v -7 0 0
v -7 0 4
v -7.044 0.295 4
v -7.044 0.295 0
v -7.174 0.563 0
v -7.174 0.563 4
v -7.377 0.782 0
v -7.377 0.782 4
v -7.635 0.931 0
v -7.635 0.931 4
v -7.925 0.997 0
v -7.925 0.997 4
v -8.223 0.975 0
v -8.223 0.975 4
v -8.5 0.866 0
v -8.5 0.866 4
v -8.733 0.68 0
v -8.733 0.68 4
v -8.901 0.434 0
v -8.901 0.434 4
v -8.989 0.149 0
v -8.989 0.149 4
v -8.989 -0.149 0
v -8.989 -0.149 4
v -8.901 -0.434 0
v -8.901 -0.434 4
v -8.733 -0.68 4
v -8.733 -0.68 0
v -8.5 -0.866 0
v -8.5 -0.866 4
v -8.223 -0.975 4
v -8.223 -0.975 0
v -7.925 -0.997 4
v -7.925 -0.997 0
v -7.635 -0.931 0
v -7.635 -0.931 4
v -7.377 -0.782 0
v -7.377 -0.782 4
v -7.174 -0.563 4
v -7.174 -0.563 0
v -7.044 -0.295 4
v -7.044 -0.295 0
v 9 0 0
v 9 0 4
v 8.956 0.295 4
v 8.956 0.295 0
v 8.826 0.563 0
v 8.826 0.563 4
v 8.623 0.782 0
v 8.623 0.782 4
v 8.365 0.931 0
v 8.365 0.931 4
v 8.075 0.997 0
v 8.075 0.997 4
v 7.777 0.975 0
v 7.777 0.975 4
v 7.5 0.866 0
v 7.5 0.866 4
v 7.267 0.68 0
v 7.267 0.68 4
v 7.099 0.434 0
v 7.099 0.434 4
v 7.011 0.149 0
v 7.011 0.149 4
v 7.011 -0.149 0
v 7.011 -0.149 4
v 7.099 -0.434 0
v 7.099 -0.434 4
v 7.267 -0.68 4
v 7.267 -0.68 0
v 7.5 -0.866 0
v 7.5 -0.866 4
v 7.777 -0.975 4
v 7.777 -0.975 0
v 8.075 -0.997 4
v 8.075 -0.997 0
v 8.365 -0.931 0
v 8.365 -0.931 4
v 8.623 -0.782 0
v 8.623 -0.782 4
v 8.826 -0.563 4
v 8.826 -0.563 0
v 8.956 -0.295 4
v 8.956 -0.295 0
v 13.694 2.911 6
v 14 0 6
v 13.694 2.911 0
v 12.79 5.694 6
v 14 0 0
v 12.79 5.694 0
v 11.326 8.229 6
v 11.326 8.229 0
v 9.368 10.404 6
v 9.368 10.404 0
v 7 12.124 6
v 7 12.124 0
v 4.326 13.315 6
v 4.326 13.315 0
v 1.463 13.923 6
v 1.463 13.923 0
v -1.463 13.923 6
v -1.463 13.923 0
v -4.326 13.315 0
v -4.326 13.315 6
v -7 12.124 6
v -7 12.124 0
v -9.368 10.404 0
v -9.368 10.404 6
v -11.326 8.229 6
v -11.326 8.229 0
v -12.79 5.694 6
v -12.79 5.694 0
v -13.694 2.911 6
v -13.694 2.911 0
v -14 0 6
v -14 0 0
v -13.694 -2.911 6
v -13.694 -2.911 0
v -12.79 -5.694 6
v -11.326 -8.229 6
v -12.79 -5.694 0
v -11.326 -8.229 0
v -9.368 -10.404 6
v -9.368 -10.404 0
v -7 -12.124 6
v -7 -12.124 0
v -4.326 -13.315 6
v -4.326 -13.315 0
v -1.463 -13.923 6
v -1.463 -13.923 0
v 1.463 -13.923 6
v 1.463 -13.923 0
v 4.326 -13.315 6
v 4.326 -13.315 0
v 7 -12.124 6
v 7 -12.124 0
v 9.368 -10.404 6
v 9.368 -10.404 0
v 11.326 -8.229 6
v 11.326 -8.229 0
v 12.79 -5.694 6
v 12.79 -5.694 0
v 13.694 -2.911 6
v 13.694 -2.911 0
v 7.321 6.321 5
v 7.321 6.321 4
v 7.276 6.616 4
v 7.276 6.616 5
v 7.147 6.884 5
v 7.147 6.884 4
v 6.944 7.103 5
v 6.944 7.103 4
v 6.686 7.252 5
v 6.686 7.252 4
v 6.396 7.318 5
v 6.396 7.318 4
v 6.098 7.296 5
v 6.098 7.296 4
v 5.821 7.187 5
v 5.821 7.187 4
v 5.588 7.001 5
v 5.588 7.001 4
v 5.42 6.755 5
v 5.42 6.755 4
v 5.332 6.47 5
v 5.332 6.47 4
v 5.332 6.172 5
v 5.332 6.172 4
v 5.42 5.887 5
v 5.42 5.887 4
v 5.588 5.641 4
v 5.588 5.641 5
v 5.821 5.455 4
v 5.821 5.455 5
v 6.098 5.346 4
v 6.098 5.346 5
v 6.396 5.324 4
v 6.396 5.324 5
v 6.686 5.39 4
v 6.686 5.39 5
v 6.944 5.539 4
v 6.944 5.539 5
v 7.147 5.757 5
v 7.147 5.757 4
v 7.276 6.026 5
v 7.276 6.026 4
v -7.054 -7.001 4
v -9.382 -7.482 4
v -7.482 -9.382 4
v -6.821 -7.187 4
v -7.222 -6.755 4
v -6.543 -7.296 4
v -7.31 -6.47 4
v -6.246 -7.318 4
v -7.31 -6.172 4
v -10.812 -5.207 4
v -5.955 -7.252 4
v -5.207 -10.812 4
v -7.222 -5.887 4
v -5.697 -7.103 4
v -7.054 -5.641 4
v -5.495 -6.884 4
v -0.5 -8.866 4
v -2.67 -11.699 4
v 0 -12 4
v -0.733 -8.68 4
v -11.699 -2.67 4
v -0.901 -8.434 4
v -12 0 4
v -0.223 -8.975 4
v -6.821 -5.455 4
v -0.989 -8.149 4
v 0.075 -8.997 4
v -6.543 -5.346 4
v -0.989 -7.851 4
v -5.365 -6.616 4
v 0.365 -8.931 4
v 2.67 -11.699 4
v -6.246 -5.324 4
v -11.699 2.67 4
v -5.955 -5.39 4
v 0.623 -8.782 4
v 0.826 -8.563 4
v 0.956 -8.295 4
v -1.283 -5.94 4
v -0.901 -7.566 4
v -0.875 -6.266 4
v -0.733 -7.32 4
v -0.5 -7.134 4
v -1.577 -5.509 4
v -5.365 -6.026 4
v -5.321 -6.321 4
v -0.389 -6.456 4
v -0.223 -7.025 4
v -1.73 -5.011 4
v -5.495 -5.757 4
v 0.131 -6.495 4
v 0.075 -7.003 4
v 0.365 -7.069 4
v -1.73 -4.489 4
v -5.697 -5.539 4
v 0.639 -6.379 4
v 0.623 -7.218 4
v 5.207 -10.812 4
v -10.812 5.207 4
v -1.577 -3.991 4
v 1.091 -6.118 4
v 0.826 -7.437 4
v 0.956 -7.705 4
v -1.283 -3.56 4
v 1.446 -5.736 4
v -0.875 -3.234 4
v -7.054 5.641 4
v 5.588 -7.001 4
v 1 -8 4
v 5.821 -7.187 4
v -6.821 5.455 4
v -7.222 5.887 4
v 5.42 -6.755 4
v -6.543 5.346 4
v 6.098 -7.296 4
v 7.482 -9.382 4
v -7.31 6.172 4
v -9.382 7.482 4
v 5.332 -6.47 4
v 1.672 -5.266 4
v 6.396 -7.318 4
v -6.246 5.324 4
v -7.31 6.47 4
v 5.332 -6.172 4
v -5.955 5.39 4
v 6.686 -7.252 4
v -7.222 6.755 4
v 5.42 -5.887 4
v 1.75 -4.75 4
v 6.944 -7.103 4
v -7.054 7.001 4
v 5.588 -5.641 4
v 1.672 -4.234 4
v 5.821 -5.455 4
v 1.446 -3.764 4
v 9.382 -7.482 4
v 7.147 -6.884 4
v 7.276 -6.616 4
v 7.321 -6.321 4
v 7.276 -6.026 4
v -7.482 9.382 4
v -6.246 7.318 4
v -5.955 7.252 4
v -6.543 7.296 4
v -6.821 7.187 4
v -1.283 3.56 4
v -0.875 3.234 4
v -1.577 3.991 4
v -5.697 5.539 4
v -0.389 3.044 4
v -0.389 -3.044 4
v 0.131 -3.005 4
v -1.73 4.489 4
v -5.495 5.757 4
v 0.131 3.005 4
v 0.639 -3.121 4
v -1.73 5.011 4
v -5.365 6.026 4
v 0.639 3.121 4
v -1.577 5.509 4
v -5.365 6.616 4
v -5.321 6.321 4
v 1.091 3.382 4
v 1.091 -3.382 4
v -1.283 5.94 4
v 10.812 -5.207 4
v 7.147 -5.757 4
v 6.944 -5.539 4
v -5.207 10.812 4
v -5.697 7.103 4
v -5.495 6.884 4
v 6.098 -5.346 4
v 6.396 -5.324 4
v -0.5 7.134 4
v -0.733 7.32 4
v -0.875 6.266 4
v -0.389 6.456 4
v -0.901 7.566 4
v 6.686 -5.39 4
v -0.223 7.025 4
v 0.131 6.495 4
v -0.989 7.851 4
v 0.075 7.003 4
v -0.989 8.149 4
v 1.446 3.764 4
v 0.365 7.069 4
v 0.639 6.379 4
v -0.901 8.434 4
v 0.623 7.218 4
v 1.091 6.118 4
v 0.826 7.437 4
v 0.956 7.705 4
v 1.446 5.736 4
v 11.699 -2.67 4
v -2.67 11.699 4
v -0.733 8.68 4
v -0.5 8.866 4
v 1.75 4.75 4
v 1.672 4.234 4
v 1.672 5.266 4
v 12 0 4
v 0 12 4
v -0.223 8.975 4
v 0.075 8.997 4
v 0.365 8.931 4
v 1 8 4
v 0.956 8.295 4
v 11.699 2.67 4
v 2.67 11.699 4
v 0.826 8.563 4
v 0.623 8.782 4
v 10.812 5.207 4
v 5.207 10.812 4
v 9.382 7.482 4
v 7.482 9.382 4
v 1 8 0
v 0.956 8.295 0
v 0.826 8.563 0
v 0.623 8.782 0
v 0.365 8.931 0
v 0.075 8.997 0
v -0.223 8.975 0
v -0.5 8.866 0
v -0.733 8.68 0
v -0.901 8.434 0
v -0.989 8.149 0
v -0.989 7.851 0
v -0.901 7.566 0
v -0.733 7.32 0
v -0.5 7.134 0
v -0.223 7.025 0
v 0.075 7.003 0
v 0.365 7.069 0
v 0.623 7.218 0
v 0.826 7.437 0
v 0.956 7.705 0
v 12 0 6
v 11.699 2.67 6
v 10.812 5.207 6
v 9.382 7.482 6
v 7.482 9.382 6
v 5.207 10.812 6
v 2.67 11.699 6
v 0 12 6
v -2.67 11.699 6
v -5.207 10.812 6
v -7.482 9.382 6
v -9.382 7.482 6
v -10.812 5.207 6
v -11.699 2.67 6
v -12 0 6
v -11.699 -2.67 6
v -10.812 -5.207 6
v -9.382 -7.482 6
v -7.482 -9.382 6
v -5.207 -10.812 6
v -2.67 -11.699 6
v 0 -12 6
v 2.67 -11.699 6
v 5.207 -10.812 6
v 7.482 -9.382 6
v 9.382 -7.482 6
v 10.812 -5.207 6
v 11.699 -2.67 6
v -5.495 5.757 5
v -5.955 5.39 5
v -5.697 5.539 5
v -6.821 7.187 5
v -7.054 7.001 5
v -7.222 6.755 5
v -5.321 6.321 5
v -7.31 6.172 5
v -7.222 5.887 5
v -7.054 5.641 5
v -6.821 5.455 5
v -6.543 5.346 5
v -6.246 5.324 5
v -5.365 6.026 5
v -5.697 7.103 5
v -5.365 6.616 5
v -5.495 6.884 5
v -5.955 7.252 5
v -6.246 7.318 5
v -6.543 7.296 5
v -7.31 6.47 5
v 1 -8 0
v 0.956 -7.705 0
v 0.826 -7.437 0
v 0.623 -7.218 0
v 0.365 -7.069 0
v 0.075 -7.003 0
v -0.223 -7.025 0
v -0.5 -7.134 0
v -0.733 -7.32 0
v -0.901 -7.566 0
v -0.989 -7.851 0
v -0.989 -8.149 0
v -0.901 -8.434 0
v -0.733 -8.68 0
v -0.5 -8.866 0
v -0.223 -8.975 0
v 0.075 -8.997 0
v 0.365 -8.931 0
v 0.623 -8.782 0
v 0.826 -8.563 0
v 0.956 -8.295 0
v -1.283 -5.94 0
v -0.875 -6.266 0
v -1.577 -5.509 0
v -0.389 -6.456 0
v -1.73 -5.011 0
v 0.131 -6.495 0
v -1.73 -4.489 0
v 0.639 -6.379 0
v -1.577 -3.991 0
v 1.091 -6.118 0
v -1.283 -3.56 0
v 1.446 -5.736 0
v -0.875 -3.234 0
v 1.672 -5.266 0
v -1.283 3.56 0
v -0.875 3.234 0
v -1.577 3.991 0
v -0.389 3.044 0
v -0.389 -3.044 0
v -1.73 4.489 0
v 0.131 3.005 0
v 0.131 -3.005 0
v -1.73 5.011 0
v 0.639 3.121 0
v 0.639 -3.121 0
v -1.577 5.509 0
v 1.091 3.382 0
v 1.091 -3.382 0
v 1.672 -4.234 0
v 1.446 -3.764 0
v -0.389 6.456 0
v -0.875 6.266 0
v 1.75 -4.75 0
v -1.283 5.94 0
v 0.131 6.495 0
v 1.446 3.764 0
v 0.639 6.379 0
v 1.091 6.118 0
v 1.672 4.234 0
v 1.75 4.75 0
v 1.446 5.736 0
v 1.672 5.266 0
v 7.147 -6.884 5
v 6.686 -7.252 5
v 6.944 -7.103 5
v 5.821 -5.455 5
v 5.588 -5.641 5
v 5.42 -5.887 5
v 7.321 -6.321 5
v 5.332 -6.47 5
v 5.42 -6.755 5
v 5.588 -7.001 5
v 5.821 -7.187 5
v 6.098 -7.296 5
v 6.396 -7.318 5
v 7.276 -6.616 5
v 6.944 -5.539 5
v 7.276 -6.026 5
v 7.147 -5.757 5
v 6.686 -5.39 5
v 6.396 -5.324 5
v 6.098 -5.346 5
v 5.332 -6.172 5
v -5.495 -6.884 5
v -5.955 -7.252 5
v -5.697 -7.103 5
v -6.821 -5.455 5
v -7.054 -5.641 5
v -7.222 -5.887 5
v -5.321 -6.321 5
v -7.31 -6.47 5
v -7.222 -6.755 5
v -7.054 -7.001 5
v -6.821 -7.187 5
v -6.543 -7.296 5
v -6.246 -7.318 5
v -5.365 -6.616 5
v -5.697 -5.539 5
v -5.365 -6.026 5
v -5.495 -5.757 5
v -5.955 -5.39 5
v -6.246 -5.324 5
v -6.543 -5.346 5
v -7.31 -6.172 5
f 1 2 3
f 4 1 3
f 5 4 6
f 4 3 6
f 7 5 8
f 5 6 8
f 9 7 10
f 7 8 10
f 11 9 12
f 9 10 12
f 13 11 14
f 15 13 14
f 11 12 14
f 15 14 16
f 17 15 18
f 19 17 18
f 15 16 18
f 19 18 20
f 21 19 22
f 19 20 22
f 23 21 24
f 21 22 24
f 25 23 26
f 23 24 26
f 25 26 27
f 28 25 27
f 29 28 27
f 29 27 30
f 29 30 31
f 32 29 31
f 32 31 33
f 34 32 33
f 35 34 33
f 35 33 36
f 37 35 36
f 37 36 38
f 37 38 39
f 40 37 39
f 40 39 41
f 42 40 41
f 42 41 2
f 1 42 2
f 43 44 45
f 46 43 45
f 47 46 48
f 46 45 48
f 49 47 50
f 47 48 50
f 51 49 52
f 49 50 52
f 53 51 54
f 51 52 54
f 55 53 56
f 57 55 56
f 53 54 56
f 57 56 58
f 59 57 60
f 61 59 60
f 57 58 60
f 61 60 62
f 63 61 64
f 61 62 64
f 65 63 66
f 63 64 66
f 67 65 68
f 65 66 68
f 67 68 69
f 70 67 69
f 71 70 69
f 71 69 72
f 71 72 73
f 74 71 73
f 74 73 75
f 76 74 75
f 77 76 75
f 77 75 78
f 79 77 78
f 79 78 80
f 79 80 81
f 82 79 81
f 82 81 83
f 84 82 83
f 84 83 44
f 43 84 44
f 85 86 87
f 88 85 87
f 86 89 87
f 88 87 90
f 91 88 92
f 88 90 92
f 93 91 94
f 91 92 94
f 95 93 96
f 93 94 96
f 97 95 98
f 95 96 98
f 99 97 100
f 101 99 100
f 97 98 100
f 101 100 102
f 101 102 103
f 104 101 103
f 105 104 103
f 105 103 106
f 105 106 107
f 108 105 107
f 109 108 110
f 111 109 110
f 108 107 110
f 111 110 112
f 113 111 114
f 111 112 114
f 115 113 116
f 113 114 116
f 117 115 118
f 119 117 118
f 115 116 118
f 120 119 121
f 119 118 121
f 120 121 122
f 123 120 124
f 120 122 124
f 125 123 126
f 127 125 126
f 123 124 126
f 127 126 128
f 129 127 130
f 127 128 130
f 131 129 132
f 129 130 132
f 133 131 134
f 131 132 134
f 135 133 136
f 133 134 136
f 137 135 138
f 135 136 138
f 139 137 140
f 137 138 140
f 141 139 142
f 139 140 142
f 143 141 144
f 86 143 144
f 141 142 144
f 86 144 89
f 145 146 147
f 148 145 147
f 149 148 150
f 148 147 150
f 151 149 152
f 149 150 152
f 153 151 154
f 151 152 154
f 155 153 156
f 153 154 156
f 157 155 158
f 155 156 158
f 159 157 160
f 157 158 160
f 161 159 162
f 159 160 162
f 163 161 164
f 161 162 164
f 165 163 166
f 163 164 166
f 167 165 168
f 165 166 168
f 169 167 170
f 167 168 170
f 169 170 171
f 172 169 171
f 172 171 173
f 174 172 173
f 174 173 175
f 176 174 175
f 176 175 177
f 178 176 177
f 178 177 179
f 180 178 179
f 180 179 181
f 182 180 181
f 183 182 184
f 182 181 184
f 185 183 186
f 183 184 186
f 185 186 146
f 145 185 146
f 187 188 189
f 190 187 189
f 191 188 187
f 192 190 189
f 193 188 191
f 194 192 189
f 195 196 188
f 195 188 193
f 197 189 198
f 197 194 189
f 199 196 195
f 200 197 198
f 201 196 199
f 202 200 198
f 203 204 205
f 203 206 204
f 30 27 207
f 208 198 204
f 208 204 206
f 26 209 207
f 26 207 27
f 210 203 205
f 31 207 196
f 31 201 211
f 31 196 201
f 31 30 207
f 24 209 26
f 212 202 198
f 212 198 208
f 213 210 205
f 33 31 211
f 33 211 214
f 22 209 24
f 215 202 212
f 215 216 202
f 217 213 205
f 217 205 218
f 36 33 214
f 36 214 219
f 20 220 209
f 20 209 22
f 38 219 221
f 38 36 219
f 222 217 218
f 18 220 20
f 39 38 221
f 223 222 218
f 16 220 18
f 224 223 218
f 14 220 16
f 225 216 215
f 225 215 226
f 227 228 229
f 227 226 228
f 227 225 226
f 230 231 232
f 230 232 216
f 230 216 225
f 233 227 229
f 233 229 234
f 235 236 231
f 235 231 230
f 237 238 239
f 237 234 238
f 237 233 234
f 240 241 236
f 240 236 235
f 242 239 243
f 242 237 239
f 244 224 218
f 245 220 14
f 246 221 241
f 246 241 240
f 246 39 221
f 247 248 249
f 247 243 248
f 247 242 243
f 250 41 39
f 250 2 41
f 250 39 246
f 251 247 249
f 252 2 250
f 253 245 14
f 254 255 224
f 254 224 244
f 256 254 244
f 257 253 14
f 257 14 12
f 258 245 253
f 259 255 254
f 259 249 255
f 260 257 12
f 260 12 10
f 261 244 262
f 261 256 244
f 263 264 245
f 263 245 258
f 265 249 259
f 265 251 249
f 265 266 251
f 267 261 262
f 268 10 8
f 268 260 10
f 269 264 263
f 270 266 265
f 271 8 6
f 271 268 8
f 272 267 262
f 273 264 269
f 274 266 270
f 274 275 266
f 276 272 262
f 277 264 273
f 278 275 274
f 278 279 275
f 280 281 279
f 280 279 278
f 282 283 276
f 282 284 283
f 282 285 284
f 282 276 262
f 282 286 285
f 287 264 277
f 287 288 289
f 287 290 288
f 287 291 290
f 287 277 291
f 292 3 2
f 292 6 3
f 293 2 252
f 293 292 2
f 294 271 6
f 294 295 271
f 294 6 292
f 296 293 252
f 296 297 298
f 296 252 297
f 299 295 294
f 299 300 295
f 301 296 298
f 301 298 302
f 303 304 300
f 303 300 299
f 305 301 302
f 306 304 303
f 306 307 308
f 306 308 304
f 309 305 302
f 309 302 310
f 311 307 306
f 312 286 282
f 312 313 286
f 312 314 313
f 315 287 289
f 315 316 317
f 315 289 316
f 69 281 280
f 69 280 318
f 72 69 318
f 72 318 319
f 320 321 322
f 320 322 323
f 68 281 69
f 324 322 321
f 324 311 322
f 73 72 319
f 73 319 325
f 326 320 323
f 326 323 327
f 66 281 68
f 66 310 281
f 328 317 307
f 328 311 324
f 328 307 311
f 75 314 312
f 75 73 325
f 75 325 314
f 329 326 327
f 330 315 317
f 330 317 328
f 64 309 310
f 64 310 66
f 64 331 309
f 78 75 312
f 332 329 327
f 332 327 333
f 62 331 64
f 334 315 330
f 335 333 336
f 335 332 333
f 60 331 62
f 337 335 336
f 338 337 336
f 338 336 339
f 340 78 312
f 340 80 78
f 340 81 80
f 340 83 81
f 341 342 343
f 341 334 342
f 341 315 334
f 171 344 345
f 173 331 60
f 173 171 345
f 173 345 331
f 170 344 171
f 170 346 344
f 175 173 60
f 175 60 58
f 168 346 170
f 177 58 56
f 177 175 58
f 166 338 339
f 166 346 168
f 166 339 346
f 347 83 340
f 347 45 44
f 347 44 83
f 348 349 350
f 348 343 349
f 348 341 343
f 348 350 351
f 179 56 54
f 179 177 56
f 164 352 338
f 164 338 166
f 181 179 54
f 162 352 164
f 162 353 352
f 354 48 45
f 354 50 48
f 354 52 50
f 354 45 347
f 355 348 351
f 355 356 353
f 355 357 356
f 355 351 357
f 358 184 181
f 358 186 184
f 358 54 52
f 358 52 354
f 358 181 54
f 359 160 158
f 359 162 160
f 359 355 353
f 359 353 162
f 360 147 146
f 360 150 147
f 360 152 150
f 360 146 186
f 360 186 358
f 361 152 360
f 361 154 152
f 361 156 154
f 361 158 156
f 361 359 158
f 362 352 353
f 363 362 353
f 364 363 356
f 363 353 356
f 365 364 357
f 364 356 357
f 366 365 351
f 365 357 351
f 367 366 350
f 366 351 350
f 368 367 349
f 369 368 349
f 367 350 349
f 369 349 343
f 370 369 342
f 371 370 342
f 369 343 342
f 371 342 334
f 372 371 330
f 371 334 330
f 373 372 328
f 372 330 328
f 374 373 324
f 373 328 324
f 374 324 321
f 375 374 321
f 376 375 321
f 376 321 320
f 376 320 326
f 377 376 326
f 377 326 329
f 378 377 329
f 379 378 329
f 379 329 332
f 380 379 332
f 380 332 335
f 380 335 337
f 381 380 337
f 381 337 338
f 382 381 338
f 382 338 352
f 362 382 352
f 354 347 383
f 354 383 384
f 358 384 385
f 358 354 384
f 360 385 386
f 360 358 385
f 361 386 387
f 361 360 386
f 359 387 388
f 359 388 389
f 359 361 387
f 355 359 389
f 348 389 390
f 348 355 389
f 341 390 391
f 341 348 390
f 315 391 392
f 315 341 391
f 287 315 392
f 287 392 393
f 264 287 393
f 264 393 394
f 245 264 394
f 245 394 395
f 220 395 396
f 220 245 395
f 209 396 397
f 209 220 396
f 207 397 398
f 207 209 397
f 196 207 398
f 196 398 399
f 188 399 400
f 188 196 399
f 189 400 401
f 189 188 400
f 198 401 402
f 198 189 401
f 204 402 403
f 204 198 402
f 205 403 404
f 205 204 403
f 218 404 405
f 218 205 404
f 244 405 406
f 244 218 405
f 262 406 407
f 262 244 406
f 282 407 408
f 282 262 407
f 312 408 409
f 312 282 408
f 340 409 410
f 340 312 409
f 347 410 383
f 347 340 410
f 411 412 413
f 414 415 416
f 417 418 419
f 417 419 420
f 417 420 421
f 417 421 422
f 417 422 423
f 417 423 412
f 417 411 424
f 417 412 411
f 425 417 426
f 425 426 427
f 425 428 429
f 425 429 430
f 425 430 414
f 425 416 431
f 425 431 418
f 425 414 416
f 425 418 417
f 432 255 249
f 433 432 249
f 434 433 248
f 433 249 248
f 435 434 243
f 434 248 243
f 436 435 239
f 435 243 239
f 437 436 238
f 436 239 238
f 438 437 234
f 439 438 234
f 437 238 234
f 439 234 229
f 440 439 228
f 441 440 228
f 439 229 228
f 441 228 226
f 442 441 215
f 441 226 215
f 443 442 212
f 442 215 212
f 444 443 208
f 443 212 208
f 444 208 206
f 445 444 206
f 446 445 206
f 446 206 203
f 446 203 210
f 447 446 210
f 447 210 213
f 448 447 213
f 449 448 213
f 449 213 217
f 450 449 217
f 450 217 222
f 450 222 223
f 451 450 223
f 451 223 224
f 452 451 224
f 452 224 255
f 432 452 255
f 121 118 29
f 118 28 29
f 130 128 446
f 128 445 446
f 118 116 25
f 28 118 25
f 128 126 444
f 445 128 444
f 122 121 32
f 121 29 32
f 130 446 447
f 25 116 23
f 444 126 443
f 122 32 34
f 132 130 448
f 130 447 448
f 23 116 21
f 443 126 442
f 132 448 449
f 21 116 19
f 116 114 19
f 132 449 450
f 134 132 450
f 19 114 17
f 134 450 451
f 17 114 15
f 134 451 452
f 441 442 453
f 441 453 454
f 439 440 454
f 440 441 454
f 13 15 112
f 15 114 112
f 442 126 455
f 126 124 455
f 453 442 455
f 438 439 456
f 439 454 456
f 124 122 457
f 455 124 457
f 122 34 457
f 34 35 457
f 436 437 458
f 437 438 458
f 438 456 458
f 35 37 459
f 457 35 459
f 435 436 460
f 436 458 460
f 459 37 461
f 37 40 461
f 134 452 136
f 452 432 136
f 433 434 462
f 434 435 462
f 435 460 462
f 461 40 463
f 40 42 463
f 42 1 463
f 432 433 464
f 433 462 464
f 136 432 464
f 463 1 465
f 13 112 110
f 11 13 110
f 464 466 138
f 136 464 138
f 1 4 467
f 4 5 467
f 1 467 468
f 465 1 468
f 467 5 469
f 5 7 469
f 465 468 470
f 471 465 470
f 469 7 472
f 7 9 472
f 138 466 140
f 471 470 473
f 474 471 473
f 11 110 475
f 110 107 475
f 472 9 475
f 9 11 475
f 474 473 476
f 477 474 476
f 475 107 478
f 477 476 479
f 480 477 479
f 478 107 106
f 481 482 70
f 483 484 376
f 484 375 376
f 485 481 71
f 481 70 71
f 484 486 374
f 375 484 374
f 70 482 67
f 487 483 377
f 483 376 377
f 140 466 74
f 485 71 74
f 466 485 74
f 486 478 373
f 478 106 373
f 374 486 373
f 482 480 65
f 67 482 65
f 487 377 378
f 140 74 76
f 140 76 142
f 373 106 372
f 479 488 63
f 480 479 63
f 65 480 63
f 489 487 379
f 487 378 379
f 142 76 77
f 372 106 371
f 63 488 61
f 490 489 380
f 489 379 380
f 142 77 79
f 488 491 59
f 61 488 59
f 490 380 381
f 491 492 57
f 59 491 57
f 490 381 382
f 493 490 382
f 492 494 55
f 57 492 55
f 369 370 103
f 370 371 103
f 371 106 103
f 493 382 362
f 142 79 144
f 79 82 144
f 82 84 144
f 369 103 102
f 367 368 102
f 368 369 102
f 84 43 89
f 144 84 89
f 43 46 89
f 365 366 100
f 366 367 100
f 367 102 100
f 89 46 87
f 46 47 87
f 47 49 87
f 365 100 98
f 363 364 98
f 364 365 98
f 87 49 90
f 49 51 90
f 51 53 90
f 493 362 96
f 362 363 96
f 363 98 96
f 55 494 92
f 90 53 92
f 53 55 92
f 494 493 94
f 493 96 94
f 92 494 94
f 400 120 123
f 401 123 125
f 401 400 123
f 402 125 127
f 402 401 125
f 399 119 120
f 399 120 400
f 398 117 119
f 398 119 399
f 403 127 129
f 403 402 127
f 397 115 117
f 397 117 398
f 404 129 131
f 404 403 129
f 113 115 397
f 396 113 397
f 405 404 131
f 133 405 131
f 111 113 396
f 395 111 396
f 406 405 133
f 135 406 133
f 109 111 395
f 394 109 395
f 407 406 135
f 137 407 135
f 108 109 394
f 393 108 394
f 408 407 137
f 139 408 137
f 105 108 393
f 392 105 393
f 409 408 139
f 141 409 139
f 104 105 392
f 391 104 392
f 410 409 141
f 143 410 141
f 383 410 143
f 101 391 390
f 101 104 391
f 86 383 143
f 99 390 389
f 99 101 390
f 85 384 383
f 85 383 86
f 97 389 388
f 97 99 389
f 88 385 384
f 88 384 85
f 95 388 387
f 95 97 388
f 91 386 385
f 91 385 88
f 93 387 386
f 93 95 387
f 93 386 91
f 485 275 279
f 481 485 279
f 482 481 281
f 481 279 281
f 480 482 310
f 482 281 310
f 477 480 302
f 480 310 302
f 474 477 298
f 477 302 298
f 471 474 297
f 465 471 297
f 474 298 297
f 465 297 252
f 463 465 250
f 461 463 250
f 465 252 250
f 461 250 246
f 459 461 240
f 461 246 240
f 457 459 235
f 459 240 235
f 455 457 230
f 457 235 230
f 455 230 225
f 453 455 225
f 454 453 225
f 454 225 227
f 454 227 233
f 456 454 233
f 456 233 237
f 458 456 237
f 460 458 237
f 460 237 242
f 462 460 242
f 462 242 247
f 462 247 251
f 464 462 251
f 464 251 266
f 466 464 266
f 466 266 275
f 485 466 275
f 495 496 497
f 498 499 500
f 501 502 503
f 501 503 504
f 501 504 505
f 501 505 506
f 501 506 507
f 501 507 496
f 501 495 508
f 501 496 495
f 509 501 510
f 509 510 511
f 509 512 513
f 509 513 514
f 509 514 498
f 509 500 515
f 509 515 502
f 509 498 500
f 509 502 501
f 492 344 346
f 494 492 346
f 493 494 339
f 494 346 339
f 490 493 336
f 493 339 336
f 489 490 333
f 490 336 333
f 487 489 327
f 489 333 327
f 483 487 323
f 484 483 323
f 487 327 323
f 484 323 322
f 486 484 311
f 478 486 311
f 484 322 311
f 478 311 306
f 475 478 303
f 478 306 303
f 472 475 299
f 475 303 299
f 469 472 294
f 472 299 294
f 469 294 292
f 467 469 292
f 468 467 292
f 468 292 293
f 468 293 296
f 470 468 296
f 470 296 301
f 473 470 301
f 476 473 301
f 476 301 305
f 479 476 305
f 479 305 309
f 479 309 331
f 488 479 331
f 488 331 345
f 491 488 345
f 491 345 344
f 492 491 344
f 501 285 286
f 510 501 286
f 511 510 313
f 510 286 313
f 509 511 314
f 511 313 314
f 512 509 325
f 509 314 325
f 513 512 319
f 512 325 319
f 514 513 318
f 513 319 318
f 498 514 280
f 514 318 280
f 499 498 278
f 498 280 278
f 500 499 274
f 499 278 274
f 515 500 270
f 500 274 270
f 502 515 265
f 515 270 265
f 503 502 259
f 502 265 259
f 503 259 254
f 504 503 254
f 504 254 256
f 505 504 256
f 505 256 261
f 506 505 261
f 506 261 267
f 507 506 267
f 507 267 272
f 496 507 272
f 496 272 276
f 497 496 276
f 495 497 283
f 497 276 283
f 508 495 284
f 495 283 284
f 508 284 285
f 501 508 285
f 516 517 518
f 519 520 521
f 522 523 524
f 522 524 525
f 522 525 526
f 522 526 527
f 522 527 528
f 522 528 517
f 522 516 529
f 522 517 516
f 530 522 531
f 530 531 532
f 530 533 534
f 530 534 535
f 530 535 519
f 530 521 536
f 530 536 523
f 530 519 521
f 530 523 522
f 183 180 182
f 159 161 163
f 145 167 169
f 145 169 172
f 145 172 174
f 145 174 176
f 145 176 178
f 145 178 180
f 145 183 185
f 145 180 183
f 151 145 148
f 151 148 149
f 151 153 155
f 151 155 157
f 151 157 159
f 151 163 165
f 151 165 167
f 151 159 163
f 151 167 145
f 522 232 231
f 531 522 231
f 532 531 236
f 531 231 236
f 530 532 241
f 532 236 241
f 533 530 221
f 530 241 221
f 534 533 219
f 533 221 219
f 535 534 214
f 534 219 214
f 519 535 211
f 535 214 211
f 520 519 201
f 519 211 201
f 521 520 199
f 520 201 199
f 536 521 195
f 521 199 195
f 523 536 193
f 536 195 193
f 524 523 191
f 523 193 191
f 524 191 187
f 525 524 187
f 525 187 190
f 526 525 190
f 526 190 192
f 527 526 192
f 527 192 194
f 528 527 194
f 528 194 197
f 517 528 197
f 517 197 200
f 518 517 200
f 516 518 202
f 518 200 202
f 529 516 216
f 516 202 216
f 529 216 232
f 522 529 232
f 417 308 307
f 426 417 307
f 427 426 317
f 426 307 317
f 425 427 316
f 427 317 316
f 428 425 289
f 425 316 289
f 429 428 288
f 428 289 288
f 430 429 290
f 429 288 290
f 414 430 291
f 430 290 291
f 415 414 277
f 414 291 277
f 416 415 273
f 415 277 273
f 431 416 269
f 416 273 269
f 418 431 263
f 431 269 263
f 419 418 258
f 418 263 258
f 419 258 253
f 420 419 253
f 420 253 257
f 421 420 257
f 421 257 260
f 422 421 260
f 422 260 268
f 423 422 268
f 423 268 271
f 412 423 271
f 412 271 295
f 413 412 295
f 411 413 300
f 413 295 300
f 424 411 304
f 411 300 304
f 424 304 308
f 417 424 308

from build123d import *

# Parameters (mm, degrees)
SKETCH1_R           = 14
BOSS_EXTRUDE1_DEPTH = 4
SKETCH2_R           = 14
SKETCH2_R_2         = 12
BOSS_EXTRUDE2_DEPTH = 2
SKETCH3_R           = 1
CUT_EXTRUDE1_DEPTH  = 21.199009877
SKETCH4_R           = 1.75
CUT_EXTRUDE2_DEPTH  = 21.199009877
SKETCH5_R           = 1
BOSS_EXTRUDE3_DEPTH = 1


with BuildPart() as part:
    # Sketch1 → Boss-Extrude1 (new body)
    with BuildSketch(Plane.XY):
        Circle(SKETCH1_R)
    extrude(amount=BOSS_EXTRUDE1_DEPTH)

    # Sketch2 → Boss-Extrude2 (add)
    with BuildSketch(Plane.XY.offset(4)):
        Circle(SKETCH2_R)
        Circle(SKETCH2_R_2, mode=Mode.SUBTRACT)
    extrude(amount=BOSS_EXTRUDE2_DEPTH)

    # Sketch3 → Cut-Extrude1 (cut, through all)
    with BuildSketch(Plane.XY.offset(4)):
        with Locations((0, 8)):
            Circle(SKETCH3_R)
        with Locations((8, 0)):
            Circle(SKETCH3_R)
        with Locations((0, -8)):
            Circle(SKETCH3_R)
        with Locations((-8, 0)):
            Circle(SKETCH3_R)
    extrude(amount=-CUT_EXTRUDE1_DEPTH, mode=Mode.SUBTRACT)

    # Sketch4 → Cut-Extrude2 (cut, through all)
    with BuildSketch(Plane.XY.offset(4)):
        with Locations((0, 4.75)):
            Circle(SKETCH4_R)
        with Locations((0, -4.75)):
            Circle(SKETCH4_R)
    extrude(amount=-CUT_EXTRUDE2_DEPTH, mode=Mode.SUBTRACT)

    # Sketch5 → Boss-Extrude3 (add)
    with BuildSketch(Plane.XY.offset(4)):
        with Locations((-6.320770843, -6.320770843)):
            Circle(SKETCH5_R)
        with Locations((-6.320770843, 6.320770843)):
            Circle(SKETCH5_R)
        with Locations((6.320770843, 6.320770843)):
            Circle(SKETCH5_R)
        with Locations((6.320770843, -6.320770843)):
            Circle(SKETCH5_R)
    extrude(amount=BOSS_EXTRUDE3_DEPTH)


solid = part.part
